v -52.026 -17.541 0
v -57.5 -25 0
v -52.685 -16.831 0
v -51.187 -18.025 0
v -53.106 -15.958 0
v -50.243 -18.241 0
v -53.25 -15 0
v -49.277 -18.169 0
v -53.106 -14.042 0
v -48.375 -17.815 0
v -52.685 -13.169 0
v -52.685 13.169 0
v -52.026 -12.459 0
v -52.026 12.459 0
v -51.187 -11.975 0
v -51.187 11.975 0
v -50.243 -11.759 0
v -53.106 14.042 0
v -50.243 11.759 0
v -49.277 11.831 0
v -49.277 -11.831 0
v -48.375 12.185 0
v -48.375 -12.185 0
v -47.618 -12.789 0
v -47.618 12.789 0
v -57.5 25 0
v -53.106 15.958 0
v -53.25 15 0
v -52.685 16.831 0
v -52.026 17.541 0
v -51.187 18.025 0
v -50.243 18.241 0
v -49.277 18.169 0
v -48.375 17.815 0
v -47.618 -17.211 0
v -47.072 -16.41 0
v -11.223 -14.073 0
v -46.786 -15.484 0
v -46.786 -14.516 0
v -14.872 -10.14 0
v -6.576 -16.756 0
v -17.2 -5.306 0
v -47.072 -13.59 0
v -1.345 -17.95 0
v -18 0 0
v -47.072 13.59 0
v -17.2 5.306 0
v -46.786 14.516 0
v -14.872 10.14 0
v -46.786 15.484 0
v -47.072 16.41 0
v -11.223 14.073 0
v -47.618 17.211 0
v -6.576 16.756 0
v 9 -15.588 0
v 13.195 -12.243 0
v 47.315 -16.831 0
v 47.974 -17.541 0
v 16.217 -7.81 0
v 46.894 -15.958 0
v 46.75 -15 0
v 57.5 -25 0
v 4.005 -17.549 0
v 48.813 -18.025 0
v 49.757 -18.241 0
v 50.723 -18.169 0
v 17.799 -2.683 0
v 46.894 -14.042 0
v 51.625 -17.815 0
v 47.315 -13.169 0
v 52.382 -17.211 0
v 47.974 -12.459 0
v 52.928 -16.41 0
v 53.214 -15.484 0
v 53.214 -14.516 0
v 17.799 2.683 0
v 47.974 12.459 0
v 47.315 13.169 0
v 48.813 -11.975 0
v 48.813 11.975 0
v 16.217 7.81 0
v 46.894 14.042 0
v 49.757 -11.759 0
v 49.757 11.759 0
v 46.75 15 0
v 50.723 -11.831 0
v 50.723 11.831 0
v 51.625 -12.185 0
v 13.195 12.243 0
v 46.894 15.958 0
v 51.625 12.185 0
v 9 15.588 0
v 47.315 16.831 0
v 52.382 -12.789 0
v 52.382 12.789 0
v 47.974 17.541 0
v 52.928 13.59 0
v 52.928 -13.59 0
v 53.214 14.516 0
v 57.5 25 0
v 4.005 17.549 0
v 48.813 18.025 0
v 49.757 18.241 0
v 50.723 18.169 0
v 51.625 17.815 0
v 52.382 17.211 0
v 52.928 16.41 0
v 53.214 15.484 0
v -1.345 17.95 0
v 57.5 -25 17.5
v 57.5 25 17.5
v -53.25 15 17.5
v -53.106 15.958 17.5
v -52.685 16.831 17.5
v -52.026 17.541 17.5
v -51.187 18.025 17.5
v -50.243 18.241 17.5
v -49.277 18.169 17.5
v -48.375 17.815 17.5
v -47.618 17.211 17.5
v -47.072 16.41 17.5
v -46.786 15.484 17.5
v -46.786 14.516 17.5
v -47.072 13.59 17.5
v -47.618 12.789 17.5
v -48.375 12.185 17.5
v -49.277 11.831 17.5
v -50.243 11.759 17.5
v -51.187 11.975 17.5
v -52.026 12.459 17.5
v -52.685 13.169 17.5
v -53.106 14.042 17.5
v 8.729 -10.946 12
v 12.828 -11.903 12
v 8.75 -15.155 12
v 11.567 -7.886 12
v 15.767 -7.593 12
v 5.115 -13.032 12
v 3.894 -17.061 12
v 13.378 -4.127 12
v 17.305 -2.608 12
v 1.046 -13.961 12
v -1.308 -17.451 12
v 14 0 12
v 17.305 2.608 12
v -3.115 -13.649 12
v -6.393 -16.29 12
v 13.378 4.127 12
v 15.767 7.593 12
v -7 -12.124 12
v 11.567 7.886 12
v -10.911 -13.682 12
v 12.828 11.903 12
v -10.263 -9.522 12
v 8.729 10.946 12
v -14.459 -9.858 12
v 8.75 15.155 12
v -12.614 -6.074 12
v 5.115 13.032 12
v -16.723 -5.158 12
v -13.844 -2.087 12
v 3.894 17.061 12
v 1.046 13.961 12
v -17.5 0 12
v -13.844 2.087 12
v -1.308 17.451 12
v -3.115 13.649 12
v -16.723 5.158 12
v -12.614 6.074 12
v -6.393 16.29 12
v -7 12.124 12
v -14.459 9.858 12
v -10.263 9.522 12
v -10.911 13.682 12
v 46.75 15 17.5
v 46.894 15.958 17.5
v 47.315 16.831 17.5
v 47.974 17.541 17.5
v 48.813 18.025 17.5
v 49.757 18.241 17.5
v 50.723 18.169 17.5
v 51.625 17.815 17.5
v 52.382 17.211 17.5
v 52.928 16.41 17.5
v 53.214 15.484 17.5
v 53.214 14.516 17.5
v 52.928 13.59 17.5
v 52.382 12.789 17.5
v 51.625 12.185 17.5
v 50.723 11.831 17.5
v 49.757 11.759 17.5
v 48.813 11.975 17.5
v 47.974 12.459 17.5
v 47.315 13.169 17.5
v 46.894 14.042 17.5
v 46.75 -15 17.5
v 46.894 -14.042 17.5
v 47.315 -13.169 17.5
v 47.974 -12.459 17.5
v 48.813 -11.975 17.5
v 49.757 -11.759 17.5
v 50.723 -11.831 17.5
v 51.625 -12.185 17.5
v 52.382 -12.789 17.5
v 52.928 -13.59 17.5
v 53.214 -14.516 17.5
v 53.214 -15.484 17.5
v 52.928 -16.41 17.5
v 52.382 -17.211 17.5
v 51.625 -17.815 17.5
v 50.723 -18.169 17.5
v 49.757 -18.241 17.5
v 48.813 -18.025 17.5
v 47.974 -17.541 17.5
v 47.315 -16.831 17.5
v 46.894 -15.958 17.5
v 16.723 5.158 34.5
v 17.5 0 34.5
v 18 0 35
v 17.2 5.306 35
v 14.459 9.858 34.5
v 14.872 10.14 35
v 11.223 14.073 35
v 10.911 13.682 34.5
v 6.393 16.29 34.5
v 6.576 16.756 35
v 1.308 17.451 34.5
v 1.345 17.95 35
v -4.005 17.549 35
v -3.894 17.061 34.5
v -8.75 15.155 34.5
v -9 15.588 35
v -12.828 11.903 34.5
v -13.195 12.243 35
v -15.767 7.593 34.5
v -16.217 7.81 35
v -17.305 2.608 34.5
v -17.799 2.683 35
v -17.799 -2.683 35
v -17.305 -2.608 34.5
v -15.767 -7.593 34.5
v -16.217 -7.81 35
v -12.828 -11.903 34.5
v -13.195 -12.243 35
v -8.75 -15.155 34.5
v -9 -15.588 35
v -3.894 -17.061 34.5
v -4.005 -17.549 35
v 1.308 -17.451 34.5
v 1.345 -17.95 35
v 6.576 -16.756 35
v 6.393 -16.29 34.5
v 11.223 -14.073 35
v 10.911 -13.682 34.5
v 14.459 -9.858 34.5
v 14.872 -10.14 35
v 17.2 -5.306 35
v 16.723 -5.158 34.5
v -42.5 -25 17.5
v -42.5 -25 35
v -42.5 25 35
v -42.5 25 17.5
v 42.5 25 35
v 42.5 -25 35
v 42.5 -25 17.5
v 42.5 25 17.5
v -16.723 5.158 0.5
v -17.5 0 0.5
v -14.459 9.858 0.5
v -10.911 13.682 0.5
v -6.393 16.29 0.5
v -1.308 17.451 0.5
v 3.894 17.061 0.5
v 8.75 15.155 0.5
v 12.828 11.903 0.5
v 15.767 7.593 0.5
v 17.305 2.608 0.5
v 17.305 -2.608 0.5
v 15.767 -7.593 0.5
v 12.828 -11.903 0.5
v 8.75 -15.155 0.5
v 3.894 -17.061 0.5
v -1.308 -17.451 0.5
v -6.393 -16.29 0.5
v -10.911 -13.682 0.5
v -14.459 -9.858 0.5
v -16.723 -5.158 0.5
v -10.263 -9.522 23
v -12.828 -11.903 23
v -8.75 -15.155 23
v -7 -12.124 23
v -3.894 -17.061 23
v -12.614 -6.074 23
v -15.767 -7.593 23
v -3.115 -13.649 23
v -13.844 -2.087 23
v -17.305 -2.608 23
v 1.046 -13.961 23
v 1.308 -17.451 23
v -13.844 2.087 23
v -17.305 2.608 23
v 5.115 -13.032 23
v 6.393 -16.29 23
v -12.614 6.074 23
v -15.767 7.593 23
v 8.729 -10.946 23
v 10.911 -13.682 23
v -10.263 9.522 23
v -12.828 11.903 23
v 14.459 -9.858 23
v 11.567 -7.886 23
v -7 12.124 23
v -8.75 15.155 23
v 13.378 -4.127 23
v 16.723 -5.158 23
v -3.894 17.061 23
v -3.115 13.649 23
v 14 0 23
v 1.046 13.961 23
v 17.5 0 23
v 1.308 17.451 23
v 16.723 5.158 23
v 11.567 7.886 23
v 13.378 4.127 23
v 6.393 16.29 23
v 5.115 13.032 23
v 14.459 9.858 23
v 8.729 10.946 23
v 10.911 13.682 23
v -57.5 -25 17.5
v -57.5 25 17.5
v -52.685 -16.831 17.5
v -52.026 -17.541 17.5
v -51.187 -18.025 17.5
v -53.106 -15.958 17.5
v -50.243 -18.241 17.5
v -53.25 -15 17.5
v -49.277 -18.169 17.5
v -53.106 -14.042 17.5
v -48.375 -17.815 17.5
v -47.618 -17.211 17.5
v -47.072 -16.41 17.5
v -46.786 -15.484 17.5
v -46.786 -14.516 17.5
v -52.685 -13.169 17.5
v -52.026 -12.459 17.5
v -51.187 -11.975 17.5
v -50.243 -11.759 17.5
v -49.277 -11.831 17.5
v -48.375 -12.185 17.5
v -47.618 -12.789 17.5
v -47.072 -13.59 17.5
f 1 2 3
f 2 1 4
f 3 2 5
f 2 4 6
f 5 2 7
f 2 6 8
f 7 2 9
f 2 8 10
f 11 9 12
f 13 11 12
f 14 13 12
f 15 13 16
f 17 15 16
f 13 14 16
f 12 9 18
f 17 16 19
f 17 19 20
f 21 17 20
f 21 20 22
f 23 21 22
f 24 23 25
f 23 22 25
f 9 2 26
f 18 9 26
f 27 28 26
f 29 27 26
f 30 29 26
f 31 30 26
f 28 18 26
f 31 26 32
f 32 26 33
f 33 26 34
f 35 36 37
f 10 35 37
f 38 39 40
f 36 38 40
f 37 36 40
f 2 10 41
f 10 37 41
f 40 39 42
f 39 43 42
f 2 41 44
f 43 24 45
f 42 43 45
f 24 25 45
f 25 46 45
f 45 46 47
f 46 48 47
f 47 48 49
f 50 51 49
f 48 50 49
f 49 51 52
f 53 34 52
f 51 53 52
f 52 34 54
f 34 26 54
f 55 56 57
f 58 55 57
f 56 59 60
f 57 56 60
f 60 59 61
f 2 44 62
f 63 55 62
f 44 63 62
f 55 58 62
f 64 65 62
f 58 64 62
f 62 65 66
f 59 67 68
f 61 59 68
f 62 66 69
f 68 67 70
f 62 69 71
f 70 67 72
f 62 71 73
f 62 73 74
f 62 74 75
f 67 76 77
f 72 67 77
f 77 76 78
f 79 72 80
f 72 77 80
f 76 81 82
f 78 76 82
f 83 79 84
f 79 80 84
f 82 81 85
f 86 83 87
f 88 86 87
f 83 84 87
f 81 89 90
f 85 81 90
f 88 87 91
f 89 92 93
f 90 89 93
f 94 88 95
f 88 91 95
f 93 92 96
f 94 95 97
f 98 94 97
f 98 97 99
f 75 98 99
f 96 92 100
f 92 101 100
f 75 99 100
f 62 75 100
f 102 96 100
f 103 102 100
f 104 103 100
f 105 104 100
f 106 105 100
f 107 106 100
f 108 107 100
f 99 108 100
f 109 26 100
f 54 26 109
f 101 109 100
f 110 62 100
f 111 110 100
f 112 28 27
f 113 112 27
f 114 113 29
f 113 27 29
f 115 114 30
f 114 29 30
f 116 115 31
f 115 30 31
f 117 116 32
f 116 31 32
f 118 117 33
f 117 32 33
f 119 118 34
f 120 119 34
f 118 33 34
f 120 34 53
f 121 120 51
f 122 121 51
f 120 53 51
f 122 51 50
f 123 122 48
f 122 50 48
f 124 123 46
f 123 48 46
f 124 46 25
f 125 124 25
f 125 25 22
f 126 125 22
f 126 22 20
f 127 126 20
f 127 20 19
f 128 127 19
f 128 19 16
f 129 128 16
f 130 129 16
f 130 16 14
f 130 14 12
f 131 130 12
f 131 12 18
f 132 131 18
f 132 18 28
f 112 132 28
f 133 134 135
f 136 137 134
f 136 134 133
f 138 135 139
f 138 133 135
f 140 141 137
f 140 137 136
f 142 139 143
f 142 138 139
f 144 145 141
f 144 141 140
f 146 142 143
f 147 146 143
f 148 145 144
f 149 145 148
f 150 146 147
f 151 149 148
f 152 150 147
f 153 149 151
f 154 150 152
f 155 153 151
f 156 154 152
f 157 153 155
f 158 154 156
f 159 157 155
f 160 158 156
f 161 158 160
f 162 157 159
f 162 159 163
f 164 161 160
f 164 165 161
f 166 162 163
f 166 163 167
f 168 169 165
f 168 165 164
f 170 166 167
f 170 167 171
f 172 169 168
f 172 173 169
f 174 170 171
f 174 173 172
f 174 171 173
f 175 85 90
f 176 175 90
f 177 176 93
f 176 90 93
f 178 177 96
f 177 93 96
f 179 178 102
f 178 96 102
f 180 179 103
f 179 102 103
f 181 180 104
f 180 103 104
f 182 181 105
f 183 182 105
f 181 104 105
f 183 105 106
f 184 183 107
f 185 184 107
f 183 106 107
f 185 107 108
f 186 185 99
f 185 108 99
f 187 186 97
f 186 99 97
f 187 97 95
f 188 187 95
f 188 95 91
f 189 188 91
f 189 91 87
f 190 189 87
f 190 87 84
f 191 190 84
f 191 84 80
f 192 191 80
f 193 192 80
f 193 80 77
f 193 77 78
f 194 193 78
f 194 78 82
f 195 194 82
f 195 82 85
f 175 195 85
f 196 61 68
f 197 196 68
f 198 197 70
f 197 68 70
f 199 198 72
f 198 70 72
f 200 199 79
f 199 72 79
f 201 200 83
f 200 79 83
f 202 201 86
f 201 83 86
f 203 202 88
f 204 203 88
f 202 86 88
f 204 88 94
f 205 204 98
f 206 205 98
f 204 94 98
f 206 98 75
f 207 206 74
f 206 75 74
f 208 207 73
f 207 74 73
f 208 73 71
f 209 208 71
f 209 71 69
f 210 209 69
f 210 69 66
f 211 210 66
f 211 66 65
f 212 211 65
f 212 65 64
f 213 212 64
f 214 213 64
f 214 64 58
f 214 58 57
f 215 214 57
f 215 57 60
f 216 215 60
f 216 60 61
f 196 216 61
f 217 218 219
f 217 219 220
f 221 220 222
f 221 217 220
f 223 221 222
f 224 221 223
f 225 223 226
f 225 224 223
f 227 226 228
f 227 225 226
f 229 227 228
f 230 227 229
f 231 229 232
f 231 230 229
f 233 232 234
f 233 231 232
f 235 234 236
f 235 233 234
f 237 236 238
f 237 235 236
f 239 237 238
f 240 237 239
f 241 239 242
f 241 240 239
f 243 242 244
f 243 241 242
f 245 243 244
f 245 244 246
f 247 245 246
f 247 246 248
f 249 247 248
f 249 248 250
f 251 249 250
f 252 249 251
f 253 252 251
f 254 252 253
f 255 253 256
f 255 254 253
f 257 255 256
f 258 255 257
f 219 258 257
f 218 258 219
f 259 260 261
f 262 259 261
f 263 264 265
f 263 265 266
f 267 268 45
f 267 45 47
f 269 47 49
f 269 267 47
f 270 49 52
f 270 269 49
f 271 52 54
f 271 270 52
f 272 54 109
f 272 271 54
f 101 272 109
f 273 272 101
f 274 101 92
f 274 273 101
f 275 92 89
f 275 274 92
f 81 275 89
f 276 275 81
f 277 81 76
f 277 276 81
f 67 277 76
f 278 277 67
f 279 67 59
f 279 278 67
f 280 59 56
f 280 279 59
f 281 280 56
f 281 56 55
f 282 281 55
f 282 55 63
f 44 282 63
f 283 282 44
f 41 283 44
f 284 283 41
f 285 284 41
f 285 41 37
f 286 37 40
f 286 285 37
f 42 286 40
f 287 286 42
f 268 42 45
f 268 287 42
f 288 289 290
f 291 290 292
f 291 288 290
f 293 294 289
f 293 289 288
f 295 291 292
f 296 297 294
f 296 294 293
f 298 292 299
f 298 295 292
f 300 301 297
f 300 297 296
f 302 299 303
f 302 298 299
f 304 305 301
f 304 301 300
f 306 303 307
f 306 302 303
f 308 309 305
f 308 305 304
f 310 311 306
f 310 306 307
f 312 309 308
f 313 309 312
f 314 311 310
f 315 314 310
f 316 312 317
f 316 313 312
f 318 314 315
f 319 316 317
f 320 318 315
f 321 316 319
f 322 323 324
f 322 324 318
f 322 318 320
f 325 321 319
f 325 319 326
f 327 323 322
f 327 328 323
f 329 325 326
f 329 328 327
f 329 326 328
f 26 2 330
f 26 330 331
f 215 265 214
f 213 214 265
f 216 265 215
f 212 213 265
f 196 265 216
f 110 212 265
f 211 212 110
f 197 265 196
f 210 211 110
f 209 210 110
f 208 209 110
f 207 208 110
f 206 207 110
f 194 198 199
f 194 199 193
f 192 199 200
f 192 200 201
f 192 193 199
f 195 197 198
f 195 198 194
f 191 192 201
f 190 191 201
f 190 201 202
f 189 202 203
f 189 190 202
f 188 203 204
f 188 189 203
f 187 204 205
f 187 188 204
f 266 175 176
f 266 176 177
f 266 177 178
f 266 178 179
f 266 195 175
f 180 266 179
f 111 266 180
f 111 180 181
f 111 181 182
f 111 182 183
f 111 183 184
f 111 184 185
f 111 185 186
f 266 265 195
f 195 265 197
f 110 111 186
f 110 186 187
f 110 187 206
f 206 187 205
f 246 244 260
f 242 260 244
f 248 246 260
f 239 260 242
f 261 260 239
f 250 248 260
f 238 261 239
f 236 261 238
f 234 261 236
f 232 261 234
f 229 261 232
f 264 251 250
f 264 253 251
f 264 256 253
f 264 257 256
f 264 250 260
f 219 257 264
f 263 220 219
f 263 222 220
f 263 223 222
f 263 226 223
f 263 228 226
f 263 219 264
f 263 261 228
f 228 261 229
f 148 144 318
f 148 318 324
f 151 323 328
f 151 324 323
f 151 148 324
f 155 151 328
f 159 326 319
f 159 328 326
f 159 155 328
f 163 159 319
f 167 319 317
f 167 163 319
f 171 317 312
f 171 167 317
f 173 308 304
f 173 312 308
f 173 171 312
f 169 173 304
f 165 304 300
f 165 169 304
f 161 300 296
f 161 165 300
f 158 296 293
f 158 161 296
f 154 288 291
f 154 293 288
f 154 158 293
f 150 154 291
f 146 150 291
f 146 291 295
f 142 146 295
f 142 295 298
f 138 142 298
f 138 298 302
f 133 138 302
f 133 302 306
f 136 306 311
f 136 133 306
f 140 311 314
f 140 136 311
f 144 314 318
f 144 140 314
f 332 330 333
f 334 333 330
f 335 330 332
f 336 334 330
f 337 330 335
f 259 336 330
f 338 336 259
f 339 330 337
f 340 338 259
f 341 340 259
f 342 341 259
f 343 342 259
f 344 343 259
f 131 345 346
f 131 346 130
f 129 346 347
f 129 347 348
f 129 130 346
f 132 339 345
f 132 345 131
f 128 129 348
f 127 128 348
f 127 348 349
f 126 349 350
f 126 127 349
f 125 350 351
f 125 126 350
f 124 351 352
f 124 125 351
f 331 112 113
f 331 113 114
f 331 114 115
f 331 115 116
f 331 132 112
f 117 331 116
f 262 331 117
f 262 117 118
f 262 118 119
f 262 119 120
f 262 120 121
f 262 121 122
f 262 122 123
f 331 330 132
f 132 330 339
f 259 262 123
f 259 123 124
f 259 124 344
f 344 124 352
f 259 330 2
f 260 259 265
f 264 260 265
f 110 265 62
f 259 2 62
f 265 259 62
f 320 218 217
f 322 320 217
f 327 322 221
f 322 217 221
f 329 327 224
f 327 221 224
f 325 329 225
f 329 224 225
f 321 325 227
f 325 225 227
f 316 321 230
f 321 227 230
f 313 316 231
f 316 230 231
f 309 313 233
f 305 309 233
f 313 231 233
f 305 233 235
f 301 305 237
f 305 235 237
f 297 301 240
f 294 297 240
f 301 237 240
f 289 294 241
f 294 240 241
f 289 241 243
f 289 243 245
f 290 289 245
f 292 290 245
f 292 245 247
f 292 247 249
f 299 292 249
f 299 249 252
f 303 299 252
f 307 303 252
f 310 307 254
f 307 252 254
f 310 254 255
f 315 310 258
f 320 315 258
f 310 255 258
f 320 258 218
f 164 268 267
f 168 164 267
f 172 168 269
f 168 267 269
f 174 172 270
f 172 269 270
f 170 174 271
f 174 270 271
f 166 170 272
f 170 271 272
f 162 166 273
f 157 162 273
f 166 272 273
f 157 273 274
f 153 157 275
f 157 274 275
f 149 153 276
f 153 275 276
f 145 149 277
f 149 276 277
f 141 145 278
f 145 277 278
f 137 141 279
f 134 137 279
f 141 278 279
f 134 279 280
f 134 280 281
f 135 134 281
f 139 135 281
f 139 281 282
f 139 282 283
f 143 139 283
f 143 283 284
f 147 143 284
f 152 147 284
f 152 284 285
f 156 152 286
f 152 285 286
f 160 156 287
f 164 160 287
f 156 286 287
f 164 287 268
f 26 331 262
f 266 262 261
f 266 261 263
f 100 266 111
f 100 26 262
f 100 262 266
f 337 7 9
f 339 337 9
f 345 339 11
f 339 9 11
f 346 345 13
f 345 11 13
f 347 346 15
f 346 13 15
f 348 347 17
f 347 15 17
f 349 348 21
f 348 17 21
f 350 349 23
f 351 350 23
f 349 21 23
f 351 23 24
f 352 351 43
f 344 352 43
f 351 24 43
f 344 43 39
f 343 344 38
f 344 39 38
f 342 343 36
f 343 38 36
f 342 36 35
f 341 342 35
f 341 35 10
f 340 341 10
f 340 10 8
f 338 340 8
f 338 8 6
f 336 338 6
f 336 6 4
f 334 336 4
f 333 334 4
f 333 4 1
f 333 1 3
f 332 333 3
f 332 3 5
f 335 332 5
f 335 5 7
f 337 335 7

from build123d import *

# Parameters (mm, degrees)
SZKIC1_W                    = 115
SZKIC1_H                    = 50
SZKIC1_R                    = 14
DODANIE_WYCI_GNI_CIE1_DEPTH = 35
SZKIC2_R                    = 17.5
WYTNIJ_WYCI_GNI_CIE1_DEPTH  = 12
SZKIC3_R                    = 17.5
WYTNIJ_WYCI_GNI_CIE2_DEPTH  = 12
SZKIC4_R                    = 3.25
WYTNIJ_WYCI_GNI_CIE3_DEPTH  = 36
SZKIC5_W                    = 15
SZKIC5_H                    = 50
WYTNIJ_WYCI_GNI_CIE4_DEPTH  = 17.5
SFAZOWANIE1_SIZE            = 0.5


with BuildPart() as part:
    # Szkic1 → Dodanie-wyciągnięcie1 (new body)
    with BuildSketch(Plane.XY):
        Rectangle(SZKIC1_W, SZKIC1_H)
        Circle(SZKIC1_R, mode=Mode.SUBTRACT)
    extrude(amount=DODANIE_WYCI_GNI_CIE1_DEPTH)

    # Szkic2 → Wytnij-wyciągnięcie1 (cut)
    with BuildSketch(Plane.XY.offset(35)):
        Circle(SZKIC2_R)
    extrude(amount=-WYTNIJ_WYCI_GNI_CIE1_DEPTH, mode=Mode.SUBTRACT)

    # Szkic3 → Wytnij-wyciągnięcie2 (cut)
    with BuildSketch(Plane(origin=(0, 0, 0), x_dir=(-1, 0, 0), z_dir=(0, 0, -1))):
        Circle(SZKIC3_R)
    extrude(amount=-WYTNIJ_WYCI_GNI_CIE2_DEPTH, mode=Mode.SUBTRACT)

    # Szkic4 → Wytnij-wyciągnięcie3 (cut, through all)
    with BuildSketch(Plane(origin=(0, 0, 0), x_dir=(-1, 0, 0), z_dir=(0, 0, -1))):
        with Locations((-50, 15)):
            Circle(SZKIC4_R)
        with Locations((-50, -15)):
            Circle(SZKIC4_R)
        with Locations((50, 15)):
            Circle(SZKIC4_R)
        with Locations((50, -15)):
            Circle(SZKIC4_R)
    extrude(amount=-WYTNIJ_WYCI_GNI_CIE3_DEPTH, mode=Mode.SUBTRACT)

    # Szkic5 → Wytnij-wyciągnięcie4 (cut)
    with BuildSketch(Plane.XY.offset(35)):
        with Locations((50, 0)):
            Rectangle(SZKIC5_W, SZKIC5_H)
        with Locations((-50, 0)):
            Rectangle(SZKIC5_W, SZKIC5_H)
    extrude(amount=-WYTNIJ_WYCI_GNI_CIE4_DEPTH, mode=Mode.SUBTRACT)

    # Sfazowanie1
    sfazowanie1_edges = [part.edges().sort_by_distance(p)[0] for p in [
        (-17.5, 0, 35),
        (17.5, 0, 0),
    ]]
    chamfer(sfazowanie1_edges, length=SFAZOWANIE1_SIZE)


solid = part.part
